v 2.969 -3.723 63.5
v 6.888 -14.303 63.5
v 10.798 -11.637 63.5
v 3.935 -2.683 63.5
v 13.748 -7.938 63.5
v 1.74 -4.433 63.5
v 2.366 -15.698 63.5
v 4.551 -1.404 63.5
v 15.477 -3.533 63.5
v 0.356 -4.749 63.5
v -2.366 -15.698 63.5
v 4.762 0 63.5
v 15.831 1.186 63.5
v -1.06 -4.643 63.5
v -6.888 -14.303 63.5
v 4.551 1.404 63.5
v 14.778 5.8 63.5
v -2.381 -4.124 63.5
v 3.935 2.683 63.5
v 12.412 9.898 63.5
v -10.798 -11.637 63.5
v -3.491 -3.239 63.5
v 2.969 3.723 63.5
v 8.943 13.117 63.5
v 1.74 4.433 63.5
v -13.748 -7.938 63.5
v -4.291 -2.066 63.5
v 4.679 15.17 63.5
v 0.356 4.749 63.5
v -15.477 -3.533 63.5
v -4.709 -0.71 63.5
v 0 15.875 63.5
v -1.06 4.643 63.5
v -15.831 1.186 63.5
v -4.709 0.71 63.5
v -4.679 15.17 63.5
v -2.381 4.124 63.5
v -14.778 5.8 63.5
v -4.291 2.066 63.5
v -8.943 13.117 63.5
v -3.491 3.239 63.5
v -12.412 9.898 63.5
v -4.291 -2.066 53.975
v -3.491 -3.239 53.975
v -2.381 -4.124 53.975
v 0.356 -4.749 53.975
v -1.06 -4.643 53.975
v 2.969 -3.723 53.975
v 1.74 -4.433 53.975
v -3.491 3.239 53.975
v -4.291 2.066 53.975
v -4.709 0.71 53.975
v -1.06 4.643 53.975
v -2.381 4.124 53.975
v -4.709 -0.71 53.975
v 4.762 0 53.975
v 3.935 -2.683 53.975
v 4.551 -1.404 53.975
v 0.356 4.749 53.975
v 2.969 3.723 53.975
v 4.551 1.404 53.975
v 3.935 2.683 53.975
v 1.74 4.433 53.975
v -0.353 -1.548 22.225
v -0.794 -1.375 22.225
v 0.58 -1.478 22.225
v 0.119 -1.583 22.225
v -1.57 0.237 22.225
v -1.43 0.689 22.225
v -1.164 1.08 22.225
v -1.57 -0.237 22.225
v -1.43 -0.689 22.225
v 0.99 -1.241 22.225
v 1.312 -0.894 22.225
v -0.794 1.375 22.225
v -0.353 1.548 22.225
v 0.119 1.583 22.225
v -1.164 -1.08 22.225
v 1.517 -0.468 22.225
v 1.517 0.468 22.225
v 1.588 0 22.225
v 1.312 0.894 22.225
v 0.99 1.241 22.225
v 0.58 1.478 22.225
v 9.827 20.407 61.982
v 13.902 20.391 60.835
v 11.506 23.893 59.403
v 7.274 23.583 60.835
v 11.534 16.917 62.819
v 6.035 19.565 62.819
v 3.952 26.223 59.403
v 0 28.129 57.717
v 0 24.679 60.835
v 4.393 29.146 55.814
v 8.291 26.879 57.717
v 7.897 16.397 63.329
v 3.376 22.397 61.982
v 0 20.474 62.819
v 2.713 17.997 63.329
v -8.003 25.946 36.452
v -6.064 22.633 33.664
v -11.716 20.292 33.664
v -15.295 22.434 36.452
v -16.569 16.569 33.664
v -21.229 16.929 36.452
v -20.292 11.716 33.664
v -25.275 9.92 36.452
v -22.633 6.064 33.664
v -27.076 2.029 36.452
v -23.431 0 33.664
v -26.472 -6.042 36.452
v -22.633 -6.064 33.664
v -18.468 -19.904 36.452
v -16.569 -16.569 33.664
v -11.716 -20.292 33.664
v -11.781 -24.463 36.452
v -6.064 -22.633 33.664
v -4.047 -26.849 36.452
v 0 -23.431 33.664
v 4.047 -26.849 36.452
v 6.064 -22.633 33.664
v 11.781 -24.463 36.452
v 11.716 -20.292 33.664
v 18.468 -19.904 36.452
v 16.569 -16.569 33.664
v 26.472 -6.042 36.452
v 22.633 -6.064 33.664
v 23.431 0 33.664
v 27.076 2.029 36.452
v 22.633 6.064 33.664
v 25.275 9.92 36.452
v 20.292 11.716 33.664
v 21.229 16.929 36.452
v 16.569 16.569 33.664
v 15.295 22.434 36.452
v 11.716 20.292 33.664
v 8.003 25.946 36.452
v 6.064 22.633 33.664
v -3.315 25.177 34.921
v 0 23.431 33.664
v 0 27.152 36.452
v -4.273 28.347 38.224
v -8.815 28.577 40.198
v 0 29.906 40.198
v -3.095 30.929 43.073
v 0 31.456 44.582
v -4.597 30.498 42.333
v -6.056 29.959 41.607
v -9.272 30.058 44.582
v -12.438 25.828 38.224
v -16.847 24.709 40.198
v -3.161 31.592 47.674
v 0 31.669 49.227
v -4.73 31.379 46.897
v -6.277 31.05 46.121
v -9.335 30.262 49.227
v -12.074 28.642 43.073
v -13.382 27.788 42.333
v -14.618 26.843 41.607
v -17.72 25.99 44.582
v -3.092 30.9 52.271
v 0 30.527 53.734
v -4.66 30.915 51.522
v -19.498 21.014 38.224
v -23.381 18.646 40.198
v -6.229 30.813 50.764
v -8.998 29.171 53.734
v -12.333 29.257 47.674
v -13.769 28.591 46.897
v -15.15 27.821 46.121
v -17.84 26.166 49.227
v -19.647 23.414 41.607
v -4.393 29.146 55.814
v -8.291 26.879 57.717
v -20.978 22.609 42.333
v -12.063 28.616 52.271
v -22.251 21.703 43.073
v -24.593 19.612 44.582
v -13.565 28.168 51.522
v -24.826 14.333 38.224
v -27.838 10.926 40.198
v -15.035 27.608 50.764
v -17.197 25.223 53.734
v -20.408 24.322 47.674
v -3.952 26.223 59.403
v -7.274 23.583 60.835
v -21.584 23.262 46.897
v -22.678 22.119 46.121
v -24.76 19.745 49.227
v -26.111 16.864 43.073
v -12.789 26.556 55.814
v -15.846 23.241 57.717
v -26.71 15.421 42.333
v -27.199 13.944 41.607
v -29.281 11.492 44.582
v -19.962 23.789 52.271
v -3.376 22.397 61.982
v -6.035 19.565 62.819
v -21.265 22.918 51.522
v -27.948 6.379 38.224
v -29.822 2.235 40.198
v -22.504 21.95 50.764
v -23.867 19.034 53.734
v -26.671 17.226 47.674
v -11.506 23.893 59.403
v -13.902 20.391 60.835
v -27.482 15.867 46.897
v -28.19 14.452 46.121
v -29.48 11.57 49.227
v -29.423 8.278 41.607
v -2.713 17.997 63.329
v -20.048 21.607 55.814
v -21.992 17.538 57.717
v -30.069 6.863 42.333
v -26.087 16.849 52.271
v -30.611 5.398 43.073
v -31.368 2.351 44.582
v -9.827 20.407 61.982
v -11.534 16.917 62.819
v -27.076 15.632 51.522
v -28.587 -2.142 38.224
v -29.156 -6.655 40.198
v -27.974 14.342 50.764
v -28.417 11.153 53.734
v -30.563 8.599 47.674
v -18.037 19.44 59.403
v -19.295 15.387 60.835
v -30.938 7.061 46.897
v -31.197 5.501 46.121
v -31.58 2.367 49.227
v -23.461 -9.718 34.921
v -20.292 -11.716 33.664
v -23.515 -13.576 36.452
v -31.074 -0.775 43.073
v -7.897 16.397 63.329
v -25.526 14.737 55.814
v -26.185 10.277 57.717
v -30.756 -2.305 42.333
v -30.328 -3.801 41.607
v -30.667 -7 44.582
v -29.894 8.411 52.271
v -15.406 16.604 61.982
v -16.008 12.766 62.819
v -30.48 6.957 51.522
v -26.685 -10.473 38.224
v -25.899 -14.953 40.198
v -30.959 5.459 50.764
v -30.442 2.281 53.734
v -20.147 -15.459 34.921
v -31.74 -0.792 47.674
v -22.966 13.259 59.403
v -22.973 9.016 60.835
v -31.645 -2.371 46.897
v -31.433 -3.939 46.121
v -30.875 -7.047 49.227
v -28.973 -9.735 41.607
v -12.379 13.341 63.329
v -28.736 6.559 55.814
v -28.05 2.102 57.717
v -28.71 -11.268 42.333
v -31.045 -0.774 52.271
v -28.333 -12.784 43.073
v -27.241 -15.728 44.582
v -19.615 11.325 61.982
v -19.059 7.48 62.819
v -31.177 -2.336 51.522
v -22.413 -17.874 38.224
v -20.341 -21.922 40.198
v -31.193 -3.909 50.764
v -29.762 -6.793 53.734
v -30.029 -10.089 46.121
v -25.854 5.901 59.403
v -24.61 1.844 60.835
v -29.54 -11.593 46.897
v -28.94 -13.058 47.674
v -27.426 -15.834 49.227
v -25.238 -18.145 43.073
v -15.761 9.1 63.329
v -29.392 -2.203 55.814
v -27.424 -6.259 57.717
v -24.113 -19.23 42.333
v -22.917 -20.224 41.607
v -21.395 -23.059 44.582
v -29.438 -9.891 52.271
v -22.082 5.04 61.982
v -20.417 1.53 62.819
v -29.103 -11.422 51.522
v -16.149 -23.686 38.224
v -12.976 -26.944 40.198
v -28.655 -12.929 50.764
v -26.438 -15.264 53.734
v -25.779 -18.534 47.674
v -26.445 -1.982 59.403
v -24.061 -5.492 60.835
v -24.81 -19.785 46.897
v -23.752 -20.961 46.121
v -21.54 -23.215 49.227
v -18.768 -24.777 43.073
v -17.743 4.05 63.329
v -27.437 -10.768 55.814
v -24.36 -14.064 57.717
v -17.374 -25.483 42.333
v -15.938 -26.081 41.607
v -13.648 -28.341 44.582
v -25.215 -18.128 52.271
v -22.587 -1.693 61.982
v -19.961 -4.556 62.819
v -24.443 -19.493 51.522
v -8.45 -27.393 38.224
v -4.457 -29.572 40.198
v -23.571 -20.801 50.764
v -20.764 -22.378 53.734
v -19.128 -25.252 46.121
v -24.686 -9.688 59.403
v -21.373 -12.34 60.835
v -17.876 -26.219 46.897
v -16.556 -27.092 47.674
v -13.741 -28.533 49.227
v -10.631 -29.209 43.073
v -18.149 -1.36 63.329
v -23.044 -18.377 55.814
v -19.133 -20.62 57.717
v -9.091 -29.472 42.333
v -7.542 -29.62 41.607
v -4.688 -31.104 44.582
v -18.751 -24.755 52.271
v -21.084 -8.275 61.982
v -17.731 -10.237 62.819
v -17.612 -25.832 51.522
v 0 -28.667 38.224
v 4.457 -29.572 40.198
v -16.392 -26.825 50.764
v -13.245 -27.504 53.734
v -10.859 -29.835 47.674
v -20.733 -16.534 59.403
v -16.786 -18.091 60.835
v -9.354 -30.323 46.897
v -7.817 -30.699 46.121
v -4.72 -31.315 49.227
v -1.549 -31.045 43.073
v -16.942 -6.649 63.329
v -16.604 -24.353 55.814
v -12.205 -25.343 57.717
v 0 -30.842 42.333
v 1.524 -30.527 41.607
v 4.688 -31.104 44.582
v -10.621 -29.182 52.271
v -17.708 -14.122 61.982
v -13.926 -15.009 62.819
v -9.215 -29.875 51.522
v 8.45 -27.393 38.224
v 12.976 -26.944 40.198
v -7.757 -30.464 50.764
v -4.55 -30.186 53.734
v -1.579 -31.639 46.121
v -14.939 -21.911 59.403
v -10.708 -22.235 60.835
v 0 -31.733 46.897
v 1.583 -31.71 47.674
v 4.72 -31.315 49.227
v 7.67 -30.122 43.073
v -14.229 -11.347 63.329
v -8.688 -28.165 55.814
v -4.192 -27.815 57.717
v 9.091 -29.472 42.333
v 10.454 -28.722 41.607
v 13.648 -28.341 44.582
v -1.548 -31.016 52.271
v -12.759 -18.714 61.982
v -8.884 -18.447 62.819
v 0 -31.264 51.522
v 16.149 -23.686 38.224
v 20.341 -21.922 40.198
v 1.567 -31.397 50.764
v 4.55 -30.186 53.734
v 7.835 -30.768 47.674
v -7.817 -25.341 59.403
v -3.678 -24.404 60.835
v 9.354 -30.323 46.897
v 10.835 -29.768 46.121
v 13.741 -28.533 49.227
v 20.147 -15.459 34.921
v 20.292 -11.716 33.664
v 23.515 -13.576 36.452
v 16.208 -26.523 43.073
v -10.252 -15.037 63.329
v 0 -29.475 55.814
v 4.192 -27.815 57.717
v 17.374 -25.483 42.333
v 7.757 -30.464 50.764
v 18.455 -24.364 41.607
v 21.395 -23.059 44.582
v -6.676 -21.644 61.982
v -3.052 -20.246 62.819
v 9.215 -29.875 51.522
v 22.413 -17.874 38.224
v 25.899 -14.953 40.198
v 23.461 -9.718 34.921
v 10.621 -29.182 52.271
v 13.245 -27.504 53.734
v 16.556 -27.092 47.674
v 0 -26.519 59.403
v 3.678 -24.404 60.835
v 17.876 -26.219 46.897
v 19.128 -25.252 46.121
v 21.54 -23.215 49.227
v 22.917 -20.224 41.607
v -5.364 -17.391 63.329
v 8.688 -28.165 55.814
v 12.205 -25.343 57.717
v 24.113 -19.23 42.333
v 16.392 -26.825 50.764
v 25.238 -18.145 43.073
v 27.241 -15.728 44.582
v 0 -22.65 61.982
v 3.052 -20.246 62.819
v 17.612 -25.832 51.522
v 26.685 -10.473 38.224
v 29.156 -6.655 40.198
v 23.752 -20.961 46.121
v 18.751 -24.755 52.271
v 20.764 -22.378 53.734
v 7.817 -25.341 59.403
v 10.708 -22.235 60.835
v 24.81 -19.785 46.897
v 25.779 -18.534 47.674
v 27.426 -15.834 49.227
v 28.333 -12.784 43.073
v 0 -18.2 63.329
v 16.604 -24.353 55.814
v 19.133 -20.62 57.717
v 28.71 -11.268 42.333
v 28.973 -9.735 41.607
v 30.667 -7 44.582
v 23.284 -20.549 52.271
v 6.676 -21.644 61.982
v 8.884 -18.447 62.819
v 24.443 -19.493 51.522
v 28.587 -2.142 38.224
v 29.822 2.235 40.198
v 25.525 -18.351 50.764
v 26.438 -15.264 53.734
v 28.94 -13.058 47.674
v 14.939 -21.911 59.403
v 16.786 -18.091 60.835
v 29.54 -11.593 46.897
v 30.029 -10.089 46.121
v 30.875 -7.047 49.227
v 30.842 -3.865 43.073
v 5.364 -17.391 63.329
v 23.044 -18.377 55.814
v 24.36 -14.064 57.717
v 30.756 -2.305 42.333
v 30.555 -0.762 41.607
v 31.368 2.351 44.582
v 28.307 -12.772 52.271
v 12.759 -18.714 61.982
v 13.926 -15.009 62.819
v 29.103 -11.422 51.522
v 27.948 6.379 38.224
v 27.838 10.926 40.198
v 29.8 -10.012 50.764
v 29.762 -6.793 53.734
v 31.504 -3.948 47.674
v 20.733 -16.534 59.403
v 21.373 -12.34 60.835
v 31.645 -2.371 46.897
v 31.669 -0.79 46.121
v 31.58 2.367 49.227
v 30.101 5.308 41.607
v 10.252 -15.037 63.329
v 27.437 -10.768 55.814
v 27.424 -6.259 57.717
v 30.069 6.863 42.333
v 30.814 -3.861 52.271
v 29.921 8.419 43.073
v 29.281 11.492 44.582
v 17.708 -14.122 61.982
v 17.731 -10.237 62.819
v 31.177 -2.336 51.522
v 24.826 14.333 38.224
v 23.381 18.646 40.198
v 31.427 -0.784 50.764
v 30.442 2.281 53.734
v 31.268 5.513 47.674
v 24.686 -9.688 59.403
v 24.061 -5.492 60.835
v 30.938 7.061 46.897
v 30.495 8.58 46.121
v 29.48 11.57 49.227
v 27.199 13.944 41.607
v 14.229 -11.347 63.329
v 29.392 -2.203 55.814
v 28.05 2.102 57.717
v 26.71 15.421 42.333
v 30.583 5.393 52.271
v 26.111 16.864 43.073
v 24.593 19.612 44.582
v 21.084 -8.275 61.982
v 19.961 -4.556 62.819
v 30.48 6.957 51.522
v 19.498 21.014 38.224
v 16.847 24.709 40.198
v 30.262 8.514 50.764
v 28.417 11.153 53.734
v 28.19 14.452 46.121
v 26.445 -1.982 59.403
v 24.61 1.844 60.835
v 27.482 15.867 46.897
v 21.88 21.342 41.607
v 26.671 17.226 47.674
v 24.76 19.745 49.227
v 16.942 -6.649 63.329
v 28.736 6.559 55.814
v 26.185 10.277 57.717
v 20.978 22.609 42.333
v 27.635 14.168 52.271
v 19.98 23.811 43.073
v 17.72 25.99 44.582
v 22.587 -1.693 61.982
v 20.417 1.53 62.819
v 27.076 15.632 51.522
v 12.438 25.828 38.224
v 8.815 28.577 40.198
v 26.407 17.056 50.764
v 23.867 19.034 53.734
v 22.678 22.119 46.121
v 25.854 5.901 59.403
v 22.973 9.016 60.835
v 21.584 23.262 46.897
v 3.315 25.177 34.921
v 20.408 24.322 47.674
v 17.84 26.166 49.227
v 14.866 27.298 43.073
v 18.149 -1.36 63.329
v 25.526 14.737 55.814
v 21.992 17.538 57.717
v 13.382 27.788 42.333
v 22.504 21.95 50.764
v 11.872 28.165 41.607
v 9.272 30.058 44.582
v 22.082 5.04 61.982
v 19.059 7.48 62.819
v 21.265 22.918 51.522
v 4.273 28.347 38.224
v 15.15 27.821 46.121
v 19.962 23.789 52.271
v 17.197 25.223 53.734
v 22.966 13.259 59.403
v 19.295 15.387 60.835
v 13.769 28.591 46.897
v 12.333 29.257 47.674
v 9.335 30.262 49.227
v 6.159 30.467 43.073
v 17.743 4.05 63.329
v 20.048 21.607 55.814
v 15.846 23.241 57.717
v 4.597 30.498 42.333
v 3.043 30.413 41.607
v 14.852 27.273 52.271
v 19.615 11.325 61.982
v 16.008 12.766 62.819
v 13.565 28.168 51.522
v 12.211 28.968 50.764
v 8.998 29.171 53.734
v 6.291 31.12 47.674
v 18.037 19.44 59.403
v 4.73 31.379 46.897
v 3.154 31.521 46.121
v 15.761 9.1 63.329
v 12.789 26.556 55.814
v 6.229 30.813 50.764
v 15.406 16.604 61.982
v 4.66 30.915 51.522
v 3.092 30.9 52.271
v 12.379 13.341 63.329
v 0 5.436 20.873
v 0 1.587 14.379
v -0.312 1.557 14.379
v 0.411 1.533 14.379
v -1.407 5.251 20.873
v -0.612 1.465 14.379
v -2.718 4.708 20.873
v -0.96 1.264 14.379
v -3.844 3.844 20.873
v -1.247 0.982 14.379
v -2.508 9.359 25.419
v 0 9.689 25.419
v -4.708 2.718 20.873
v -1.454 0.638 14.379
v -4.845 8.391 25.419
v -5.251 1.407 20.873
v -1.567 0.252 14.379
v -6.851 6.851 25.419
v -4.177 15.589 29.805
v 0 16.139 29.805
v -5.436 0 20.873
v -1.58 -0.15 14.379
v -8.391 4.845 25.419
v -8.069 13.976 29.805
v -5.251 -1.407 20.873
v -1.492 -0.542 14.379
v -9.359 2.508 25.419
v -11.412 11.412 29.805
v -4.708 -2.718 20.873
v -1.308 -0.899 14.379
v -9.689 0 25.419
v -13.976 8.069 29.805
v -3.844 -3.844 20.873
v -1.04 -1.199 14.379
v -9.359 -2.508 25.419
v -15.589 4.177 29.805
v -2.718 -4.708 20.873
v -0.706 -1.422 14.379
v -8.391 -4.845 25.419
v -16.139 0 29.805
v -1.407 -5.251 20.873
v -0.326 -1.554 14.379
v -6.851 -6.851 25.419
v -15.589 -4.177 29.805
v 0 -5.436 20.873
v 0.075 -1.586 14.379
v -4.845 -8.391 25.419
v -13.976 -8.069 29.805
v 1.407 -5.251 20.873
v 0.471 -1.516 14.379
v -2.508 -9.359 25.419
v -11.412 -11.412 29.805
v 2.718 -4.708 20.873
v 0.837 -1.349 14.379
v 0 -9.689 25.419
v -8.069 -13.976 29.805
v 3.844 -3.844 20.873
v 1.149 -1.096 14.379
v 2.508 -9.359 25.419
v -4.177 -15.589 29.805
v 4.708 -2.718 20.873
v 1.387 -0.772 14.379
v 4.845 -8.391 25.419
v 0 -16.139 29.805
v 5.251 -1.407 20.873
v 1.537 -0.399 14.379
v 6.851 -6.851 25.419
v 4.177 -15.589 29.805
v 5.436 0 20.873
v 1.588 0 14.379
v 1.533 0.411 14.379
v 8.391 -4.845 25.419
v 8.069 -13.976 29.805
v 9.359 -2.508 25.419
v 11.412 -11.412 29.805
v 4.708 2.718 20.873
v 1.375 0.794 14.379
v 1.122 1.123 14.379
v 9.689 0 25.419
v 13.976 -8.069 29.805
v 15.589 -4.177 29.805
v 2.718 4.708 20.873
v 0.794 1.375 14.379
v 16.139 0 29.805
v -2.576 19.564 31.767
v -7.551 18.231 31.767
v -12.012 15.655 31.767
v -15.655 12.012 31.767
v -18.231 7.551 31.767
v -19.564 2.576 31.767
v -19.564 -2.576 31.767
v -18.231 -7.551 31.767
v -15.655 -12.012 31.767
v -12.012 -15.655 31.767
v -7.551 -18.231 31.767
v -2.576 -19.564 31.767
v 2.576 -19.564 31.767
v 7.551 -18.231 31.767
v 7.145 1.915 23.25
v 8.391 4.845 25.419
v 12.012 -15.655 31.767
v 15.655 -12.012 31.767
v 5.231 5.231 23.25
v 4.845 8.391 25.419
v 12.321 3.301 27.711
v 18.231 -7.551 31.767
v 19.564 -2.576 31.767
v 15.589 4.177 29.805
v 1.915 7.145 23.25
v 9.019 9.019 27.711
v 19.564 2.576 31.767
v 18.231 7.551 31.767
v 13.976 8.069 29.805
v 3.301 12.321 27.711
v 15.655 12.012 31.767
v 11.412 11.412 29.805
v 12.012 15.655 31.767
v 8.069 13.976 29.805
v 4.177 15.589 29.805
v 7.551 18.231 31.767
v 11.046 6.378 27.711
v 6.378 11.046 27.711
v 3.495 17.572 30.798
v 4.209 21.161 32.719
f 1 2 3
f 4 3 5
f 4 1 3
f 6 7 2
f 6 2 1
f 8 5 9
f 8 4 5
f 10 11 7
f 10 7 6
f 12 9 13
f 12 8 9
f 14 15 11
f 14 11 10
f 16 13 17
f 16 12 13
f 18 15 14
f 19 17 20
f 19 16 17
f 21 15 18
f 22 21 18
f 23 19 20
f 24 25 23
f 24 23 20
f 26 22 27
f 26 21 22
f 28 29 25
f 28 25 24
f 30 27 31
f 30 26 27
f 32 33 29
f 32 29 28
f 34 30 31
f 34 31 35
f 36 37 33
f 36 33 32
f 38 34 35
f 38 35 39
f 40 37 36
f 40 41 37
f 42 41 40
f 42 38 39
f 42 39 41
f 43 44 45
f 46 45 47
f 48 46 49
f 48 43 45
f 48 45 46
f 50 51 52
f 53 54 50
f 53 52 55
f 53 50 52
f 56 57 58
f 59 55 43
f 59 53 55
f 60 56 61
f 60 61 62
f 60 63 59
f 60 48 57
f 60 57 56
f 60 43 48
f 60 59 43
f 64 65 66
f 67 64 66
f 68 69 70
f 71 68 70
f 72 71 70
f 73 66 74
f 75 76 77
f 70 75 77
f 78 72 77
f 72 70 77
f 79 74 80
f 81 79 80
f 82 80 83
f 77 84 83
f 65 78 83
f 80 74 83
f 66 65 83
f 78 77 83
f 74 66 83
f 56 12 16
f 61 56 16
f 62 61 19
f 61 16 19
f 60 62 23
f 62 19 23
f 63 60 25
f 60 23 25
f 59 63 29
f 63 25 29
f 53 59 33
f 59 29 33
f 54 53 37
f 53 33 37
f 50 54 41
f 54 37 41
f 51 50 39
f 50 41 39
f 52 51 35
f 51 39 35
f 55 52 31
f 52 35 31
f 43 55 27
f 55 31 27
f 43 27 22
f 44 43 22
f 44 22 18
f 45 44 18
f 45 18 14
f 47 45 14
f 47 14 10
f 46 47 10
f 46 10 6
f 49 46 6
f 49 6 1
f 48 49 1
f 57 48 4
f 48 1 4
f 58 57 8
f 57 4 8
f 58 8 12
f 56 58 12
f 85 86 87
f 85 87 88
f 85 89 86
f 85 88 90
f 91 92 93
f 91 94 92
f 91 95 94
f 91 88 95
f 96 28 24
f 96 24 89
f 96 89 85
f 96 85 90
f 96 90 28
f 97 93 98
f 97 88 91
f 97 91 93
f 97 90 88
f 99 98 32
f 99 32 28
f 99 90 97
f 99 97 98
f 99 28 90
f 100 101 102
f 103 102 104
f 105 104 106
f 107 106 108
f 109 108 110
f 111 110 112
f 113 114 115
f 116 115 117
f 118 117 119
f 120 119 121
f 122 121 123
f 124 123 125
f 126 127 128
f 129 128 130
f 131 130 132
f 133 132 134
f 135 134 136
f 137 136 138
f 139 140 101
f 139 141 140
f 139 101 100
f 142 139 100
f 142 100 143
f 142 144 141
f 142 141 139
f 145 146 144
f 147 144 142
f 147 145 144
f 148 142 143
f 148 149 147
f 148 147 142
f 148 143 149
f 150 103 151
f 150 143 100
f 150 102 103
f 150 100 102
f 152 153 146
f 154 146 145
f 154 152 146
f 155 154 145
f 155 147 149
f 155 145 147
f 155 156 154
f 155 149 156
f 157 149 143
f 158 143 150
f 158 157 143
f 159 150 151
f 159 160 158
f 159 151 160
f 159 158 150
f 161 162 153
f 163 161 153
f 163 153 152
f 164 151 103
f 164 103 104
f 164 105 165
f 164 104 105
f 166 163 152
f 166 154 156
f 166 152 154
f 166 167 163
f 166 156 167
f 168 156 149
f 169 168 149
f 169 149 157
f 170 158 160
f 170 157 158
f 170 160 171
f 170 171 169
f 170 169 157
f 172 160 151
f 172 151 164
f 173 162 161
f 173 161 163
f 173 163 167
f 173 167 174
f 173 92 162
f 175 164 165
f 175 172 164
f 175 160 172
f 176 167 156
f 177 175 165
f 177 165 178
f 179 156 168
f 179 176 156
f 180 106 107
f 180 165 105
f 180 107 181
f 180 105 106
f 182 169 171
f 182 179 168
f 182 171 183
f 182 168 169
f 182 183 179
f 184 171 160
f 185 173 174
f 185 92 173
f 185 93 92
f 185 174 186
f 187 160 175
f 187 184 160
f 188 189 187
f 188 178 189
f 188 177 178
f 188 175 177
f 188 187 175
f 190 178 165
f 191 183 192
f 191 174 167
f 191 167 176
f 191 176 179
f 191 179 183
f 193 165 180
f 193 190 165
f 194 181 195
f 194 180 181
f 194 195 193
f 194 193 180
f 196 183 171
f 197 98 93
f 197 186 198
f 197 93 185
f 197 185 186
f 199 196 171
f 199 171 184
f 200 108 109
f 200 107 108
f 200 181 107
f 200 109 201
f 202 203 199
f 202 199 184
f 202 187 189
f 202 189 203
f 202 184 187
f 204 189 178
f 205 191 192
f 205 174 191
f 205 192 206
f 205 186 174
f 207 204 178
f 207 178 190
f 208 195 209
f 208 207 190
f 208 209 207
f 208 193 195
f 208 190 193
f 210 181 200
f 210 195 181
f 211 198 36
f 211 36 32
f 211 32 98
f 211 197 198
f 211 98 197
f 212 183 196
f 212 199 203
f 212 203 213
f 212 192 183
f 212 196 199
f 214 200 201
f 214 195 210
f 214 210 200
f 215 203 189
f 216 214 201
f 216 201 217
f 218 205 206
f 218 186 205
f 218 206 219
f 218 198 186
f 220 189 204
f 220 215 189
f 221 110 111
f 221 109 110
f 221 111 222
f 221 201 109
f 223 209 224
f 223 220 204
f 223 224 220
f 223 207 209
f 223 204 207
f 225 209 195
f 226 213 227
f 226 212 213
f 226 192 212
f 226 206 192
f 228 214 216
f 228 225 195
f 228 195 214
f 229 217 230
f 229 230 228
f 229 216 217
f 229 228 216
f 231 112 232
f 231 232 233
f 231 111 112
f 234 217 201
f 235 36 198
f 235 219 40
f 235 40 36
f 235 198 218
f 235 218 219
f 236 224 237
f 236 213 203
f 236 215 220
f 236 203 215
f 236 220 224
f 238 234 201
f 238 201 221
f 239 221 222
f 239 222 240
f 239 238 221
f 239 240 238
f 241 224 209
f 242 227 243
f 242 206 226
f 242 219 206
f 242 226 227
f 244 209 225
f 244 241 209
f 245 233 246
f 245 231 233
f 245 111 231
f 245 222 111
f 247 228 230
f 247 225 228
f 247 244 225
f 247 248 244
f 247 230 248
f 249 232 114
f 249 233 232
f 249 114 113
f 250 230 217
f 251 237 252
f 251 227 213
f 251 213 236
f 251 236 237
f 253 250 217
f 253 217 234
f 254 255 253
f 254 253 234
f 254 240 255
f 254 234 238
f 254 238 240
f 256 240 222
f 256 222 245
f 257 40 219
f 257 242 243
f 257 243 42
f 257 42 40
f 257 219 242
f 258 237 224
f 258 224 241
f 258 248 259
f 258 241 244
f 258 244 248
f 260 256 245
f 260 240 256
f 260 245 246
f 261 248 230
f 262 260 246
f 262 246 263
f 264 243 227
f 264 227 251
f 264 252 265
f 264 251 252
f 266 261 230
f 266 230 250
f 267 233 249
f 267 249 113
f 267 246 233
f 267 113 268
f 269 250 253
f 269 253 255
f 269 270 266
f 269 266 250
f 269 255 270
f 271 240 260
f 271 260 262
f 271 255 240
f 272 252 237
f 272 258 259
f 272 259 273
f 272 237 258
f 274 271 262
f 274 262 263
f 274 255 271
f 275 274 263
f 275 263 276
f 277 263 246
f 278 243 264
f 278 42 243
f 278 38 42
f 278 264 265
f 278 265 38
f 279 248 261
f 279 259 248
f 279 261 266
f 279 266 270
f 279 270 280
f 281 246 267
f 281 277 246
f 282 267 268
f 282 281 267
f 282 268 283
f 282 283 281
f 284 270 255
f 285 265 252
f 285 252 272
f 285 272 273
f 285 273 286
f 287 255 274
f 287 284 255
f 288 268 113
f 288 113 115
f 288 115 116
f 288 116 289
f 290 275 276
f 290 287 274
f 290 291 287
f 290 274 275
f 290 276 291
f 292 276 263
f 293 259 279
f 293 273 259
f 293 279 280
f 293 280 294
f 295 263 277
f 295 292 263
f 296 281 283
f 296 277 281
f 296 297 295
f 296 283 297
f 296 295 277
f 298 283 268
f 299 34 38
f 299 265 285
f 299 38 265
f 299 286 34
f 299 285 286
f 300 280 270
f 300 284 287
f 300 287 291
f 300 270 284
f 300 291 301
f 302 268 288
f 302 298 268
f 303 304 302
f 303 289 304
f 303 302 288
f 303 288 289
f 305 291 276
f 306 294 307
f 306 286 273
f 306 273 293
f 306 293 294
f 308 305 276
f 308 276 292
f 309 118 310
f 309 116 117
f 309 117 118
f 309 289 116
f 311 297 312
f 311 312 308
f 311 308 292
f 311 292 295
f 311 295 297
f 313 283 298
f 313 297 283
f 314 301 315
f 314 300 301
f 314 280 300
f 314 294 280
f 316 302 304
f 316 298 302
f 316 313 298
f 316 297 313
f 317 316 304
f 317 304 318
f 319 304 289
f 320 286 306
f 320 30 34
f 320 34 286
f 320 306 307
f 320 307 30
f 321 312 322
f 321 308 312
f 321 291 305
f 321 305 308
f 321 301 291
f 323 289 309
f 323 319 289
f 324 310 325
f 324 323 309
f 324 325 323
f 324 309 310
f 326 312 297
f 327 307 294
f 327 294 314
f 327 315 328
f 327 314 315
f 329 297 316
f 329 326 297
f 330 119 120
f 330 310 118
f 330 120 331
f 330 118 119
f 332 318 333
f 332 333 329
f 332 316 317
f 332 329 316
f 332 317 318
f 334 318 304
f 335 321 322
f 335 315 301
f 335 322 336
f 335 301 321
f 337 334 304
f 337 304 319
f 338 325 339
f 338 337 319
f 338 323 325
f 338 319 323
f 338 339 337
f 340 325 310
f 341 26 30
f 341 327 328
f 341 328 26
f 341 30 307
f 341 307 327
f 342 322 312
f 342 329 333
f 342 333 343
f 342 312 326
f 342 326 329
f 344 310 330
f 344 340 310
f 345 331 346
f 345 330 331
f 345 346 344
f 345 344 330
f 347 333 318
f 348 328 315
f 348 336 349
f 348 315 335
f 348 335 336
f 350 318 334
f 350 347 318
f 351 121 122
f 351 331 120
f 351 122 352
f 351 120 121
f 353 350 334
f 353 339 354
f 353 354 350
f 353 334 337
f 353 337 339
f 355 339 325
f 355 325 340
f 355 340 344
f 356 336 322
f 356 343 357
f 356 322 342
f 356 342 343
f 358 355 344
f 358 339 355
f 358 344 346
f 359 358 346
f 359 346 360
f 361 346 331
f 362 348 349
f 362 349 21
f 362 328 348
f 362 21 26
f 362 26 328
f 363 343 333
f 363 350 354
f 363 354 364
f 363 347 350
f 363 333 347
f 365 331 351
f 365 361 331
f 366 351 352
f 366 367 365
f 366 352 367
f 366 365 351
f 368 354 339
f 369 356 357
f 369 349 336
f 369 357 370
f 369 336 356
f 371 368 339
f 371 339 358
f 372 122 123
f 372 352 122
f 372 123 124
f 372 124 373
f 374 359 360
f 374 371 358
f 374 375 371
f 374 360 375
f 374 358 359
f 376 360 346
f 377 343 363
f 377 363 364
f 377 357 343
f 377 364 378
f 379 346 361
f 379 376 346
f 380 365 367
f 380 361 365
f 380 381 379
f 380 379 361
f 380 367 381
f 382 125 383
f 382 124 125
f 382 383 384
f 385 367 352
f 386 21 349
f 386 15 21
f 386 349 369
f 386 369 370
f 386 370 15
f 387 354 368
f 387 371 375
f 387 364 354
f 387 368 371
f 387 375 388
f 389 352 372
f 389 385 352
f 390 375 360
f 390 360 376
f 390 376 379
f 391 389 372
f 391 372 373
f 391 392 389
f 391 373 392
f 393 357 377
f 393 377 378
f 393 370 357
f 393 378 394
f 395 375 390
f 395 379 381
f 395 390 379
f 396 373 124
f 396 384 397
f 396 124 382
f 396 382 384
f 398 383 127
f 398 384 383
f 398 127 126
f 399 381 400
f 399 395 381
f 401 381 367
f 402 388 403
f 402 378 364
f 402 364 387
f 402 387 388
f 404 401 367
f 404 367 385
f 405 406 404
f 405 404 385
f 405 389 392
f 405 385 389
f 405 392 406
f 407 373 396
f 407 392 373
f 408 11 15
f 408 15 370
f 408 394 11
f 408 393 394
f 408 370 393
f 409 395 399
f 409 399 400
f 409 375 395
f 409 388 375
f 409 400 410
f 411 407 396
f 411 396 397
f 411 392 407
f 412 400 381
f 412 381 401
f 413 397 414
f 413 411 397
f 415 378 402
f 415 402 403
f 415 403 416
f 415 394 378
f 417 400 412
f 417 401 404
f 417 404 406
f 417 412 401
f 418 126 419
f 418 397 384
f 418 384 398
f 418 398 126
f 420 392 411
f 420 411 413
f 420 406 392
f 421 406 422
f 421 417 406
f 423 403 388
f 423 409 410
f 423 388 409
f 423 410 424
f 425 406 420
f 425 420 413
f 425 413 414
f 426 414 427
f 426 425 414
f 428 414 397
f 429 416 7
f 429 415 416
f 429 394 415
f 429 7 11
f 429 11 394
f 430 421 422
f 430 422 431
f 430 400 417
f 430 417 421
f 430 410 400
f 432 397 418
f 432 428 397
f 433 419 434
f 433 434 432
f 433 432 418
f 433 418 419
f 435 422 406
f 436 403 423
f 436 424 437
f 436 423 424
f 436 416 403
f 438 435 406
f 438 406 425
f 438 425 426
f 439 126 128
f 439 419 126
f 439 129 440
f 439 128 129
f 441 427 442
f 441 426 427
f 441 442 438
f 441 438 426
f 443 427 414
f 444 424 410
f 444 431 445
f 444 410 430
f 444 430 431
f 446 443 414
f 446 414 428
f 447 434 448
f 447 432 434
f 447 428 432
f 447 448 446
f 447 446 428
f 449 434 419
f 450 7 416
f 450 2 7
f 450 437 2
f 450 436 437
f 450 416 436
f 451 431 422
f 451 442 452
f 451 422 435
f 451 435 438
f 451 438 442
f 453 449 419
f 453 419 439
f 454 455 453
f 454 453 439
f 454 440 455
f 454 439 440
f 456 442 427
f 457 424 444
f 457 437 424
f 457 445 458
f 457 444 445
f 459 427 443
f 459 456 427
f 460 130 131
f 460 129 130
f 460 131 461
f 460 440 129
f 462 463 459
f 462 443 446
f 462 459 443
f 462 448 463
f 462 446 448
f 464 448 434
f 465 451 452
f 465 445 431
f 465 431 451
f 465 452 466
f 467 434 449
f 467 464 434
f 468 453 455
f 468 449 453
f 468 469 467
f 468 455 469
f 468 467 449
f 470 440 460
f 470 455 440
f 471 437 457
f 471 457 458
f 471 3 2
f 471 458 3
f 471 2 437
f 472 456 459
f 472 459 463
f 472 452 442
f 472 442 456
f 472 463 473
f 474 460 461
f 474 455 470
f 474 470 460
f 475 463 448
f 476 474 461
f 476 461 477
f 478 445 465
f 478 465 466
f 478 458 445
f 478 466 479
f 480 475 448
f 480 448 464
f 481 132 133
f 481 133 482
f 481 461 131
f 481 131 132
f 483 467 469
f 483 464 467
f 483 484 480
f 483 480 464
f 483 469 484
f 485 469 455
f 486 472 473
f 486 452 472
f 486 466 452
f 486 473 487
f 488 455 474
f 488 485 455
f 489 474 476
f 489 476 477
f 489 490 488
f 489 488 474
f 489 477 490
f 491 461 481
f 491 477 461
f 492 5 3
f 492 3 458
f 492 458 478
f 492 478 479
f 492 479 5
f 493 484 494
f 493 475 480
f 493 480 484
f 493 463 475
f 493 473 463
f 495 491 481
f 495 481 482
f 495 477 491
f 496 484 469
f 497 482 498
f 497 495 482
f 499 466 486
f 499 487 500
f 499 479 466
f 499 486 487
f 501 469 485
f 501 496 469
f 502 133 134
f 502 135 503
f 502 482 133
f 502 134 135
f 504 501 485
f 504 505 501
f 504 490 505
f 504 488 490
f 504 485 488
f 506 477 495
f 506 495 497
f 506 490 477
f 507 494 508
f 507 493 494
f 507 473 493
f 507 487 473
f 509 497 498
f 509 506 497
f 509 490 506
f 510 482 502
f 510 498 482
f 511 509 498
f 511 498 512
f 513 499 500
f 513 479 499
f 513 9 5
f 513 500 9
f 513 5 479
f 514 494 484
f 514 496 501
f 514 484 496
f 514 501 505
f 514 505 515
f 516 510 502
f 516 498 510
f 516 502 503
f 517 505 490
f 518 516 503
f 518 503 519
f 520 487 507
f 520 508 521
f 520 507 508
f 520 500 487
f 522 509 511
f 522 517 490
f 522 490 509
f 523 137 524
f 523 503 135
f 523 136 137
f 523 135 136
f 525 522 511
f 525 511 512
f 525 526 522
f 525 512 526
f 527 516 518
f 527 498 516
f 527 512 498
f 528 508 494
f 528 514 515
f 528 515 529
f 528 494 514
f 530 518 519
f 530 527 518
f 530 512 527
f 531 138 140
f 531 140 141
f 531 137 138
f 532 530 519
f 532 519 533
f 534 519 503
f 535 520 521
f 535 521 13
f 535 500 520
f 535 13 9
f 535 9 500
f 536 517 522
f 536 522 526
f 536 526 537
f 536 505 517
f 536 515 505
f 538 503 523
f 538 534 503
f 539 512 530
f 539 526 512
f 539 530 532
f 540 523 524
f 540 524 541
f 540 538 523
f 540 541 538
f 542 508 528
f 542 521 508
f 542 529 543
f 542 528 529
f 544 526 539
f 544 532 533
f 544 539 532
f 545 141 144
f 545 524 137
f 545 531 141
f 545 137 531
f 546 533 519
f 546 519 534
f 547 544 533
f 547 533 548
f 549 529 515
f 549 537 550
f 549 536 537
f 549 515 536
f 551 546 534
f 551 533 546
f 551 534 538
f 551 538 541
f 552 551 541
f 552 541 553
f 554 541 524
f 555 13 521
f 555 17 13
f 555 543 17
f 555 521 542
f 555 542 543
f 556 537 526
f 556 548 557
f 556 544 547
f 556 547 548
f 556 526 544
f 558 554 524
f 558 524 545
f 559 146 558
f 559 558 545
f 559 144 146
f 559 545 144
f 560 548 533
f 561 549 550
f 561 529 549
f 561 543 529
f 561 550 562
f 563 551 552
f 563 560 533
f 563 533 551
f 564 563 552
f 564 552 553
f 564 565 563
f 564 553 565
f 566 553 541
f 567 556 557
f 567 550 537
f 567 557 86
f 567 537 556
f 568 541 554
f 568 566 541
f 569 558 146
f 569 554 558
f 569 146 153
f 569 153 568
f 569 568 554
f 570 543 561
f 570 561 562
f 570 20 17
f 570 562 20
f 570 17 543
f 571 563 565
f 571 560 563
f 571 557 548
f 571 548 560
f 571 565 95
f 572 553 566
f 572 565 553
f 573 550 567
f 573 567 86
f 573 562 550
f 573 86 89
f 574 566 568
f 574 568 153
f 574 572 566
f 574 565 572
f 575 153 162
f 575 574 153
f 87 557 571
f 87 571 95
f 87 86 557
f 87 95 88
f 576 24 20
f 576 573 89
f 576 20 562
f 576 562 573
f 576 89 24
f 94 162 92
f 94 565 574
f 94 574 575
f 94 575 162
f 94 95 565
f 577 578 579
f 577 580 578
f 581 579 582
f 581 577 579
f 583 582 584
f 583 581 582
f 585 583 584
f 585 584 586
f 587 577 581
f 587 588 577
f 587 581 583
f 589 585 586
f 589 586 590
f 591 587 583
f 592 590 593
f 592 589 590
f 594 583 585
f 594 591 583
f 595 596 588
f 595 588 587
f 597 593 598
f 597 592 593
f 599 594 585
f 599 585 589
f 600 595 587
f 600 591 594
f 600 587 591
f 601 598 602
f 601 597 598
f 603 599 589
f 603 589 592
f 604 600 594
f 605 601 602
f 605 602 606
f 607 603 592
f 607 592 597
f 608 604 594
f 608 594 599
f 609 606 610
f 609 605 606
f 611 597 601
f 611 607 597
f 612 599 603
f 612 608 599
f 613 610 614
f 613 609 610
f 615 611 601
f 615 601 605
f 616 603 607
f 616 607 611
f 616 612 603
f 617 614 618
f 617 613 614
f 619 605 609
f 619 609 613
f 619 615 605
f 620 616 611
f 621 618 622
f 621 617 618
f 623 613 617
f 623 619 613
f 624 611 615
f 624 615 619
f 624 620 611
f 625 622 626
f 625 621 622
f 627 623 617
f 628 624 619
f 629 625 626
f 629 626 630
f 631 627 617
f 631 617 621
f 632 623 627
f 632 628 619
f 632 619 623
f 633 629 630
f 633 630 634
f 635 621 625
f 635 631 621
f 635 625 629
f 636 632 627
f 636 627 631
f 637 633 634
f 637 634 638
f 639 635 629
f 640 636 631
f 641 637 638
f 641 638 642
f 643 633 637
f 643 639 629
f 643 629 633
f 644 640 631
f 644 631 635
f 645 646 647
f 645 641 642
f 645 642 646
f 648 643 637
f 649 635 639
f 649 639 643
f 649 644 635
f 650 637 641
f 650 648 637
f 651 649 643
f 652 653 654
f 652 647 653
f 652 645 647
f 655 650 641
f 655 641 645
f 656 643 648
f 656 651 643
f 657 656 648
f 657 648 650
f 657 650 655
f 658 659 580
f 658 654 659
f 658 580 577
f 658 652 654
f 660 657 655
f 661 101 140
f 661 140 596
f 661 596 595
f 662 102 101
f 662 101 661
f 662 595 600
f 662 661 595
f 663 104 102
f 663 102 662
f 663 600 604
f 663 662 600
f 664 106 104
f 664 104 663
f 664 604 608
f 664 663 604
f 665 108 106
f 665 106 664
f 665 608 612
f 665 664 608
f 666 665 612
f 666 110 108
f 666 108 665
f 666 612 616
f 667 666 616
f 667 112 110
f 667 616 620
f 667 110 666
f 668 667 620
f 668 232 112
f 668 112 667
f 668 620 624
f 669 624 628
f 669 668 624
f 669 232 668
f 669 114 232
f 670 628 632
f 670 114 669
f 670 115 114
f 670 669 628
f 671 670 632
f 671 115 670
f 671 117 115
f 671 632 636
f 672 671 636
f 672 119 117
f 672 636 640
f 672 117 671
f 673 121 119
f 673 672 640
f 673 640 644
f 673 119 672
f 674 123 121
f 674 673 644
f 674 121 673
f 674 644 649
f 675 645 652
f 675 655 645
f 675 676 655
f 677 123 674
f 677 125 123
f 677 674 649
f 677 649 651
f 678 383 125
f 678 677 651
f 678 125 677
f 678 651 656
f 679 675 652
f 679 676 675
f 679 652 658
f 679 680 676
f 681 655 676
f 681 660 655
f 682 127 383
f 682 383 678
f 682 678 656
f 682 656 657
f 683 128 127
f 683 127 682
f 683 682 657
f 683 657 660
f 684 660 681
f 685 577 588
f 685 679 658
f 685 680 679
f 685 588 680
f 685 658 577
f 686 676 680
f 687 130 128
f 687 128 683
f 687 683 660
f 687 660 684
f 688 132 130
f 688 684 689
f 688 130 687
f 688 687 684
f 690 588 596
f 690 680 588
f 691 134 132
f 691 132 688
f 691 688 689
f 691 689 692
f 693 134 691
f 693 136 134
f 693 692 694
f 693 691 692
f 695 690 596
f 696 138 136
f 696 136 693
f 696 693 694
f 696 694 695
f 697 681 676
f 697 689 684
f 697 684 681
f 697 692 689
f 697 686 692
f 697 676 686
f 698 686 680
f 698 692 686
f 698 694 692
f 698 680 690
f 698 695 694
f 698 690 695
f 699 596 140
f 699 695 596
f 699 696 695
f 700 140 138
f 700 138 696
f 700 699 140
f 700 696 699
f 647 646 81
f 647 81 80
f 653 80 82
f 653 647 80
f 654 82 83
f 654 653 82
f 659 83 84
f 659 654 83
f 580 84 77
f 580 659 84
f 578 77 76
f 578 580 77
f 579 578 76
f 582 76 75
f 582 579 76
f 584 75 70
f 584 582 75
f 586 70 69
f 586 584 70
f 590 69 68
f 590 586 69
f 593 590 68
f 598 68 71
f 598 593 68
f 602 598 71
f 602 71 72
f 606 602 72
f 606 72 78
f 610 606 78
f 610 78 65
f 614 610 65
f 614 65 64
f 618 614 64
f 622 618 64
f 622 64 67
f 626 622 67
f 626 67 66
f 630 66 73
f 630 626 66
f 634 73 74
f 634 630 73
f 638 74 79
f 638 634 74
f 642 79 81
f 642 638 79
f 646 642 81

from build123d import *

# Parameters (mm, degrees)
F2_R     = 4.7625
F3_DEPTH = 9.525
F4_R     = 1.5875
F5_DEPTH = 22.225


with BuildPart() as f1:
    # F0 (on Right) → F1 (revolve)
    with BuildSketch(Plane.YZ):
        with BuildLine():
            Line((0, 63.5), (0, 11.1125))
            add(Edge.make_bspline(
                [(0, 11.1125), (2.1673627178, 15.6458601549), (6.7314239675, 25.2035793611), (17.6822634898, 30.7439789651), (23.4314106154, 33.6637578056)],
                knots=[0, 0, 0, 0, 0.4745565147, 1, 1, 1, 1], degree=3))
            ThreePointArc((23.4314106154, 33.6637578056), (31.2641251349, 51.522493115), (15.875, 63.5))
            Line((15.875, 63.5), (0, 63.5))
        make_face()
    revolve(axis=Axis((0, 0, 37.30625), (0, 0, 1)))

    # F2 (on face) → F3 (cut)
    with BuildSketch(Plane.XY.offset(63.5)):
        Circle(F2_R)
    extrude(amount=-F3_DEPTH, mode=Mode.SUBTRACT)

    # F4 (on Top) → F5 (cut)
    with BuildSketch(Plane.XY):
        Circle(F4_R)
    extrude(amount=F5_DEPTH, mode=Mode.SUBTRACT)


solid = f1.part
